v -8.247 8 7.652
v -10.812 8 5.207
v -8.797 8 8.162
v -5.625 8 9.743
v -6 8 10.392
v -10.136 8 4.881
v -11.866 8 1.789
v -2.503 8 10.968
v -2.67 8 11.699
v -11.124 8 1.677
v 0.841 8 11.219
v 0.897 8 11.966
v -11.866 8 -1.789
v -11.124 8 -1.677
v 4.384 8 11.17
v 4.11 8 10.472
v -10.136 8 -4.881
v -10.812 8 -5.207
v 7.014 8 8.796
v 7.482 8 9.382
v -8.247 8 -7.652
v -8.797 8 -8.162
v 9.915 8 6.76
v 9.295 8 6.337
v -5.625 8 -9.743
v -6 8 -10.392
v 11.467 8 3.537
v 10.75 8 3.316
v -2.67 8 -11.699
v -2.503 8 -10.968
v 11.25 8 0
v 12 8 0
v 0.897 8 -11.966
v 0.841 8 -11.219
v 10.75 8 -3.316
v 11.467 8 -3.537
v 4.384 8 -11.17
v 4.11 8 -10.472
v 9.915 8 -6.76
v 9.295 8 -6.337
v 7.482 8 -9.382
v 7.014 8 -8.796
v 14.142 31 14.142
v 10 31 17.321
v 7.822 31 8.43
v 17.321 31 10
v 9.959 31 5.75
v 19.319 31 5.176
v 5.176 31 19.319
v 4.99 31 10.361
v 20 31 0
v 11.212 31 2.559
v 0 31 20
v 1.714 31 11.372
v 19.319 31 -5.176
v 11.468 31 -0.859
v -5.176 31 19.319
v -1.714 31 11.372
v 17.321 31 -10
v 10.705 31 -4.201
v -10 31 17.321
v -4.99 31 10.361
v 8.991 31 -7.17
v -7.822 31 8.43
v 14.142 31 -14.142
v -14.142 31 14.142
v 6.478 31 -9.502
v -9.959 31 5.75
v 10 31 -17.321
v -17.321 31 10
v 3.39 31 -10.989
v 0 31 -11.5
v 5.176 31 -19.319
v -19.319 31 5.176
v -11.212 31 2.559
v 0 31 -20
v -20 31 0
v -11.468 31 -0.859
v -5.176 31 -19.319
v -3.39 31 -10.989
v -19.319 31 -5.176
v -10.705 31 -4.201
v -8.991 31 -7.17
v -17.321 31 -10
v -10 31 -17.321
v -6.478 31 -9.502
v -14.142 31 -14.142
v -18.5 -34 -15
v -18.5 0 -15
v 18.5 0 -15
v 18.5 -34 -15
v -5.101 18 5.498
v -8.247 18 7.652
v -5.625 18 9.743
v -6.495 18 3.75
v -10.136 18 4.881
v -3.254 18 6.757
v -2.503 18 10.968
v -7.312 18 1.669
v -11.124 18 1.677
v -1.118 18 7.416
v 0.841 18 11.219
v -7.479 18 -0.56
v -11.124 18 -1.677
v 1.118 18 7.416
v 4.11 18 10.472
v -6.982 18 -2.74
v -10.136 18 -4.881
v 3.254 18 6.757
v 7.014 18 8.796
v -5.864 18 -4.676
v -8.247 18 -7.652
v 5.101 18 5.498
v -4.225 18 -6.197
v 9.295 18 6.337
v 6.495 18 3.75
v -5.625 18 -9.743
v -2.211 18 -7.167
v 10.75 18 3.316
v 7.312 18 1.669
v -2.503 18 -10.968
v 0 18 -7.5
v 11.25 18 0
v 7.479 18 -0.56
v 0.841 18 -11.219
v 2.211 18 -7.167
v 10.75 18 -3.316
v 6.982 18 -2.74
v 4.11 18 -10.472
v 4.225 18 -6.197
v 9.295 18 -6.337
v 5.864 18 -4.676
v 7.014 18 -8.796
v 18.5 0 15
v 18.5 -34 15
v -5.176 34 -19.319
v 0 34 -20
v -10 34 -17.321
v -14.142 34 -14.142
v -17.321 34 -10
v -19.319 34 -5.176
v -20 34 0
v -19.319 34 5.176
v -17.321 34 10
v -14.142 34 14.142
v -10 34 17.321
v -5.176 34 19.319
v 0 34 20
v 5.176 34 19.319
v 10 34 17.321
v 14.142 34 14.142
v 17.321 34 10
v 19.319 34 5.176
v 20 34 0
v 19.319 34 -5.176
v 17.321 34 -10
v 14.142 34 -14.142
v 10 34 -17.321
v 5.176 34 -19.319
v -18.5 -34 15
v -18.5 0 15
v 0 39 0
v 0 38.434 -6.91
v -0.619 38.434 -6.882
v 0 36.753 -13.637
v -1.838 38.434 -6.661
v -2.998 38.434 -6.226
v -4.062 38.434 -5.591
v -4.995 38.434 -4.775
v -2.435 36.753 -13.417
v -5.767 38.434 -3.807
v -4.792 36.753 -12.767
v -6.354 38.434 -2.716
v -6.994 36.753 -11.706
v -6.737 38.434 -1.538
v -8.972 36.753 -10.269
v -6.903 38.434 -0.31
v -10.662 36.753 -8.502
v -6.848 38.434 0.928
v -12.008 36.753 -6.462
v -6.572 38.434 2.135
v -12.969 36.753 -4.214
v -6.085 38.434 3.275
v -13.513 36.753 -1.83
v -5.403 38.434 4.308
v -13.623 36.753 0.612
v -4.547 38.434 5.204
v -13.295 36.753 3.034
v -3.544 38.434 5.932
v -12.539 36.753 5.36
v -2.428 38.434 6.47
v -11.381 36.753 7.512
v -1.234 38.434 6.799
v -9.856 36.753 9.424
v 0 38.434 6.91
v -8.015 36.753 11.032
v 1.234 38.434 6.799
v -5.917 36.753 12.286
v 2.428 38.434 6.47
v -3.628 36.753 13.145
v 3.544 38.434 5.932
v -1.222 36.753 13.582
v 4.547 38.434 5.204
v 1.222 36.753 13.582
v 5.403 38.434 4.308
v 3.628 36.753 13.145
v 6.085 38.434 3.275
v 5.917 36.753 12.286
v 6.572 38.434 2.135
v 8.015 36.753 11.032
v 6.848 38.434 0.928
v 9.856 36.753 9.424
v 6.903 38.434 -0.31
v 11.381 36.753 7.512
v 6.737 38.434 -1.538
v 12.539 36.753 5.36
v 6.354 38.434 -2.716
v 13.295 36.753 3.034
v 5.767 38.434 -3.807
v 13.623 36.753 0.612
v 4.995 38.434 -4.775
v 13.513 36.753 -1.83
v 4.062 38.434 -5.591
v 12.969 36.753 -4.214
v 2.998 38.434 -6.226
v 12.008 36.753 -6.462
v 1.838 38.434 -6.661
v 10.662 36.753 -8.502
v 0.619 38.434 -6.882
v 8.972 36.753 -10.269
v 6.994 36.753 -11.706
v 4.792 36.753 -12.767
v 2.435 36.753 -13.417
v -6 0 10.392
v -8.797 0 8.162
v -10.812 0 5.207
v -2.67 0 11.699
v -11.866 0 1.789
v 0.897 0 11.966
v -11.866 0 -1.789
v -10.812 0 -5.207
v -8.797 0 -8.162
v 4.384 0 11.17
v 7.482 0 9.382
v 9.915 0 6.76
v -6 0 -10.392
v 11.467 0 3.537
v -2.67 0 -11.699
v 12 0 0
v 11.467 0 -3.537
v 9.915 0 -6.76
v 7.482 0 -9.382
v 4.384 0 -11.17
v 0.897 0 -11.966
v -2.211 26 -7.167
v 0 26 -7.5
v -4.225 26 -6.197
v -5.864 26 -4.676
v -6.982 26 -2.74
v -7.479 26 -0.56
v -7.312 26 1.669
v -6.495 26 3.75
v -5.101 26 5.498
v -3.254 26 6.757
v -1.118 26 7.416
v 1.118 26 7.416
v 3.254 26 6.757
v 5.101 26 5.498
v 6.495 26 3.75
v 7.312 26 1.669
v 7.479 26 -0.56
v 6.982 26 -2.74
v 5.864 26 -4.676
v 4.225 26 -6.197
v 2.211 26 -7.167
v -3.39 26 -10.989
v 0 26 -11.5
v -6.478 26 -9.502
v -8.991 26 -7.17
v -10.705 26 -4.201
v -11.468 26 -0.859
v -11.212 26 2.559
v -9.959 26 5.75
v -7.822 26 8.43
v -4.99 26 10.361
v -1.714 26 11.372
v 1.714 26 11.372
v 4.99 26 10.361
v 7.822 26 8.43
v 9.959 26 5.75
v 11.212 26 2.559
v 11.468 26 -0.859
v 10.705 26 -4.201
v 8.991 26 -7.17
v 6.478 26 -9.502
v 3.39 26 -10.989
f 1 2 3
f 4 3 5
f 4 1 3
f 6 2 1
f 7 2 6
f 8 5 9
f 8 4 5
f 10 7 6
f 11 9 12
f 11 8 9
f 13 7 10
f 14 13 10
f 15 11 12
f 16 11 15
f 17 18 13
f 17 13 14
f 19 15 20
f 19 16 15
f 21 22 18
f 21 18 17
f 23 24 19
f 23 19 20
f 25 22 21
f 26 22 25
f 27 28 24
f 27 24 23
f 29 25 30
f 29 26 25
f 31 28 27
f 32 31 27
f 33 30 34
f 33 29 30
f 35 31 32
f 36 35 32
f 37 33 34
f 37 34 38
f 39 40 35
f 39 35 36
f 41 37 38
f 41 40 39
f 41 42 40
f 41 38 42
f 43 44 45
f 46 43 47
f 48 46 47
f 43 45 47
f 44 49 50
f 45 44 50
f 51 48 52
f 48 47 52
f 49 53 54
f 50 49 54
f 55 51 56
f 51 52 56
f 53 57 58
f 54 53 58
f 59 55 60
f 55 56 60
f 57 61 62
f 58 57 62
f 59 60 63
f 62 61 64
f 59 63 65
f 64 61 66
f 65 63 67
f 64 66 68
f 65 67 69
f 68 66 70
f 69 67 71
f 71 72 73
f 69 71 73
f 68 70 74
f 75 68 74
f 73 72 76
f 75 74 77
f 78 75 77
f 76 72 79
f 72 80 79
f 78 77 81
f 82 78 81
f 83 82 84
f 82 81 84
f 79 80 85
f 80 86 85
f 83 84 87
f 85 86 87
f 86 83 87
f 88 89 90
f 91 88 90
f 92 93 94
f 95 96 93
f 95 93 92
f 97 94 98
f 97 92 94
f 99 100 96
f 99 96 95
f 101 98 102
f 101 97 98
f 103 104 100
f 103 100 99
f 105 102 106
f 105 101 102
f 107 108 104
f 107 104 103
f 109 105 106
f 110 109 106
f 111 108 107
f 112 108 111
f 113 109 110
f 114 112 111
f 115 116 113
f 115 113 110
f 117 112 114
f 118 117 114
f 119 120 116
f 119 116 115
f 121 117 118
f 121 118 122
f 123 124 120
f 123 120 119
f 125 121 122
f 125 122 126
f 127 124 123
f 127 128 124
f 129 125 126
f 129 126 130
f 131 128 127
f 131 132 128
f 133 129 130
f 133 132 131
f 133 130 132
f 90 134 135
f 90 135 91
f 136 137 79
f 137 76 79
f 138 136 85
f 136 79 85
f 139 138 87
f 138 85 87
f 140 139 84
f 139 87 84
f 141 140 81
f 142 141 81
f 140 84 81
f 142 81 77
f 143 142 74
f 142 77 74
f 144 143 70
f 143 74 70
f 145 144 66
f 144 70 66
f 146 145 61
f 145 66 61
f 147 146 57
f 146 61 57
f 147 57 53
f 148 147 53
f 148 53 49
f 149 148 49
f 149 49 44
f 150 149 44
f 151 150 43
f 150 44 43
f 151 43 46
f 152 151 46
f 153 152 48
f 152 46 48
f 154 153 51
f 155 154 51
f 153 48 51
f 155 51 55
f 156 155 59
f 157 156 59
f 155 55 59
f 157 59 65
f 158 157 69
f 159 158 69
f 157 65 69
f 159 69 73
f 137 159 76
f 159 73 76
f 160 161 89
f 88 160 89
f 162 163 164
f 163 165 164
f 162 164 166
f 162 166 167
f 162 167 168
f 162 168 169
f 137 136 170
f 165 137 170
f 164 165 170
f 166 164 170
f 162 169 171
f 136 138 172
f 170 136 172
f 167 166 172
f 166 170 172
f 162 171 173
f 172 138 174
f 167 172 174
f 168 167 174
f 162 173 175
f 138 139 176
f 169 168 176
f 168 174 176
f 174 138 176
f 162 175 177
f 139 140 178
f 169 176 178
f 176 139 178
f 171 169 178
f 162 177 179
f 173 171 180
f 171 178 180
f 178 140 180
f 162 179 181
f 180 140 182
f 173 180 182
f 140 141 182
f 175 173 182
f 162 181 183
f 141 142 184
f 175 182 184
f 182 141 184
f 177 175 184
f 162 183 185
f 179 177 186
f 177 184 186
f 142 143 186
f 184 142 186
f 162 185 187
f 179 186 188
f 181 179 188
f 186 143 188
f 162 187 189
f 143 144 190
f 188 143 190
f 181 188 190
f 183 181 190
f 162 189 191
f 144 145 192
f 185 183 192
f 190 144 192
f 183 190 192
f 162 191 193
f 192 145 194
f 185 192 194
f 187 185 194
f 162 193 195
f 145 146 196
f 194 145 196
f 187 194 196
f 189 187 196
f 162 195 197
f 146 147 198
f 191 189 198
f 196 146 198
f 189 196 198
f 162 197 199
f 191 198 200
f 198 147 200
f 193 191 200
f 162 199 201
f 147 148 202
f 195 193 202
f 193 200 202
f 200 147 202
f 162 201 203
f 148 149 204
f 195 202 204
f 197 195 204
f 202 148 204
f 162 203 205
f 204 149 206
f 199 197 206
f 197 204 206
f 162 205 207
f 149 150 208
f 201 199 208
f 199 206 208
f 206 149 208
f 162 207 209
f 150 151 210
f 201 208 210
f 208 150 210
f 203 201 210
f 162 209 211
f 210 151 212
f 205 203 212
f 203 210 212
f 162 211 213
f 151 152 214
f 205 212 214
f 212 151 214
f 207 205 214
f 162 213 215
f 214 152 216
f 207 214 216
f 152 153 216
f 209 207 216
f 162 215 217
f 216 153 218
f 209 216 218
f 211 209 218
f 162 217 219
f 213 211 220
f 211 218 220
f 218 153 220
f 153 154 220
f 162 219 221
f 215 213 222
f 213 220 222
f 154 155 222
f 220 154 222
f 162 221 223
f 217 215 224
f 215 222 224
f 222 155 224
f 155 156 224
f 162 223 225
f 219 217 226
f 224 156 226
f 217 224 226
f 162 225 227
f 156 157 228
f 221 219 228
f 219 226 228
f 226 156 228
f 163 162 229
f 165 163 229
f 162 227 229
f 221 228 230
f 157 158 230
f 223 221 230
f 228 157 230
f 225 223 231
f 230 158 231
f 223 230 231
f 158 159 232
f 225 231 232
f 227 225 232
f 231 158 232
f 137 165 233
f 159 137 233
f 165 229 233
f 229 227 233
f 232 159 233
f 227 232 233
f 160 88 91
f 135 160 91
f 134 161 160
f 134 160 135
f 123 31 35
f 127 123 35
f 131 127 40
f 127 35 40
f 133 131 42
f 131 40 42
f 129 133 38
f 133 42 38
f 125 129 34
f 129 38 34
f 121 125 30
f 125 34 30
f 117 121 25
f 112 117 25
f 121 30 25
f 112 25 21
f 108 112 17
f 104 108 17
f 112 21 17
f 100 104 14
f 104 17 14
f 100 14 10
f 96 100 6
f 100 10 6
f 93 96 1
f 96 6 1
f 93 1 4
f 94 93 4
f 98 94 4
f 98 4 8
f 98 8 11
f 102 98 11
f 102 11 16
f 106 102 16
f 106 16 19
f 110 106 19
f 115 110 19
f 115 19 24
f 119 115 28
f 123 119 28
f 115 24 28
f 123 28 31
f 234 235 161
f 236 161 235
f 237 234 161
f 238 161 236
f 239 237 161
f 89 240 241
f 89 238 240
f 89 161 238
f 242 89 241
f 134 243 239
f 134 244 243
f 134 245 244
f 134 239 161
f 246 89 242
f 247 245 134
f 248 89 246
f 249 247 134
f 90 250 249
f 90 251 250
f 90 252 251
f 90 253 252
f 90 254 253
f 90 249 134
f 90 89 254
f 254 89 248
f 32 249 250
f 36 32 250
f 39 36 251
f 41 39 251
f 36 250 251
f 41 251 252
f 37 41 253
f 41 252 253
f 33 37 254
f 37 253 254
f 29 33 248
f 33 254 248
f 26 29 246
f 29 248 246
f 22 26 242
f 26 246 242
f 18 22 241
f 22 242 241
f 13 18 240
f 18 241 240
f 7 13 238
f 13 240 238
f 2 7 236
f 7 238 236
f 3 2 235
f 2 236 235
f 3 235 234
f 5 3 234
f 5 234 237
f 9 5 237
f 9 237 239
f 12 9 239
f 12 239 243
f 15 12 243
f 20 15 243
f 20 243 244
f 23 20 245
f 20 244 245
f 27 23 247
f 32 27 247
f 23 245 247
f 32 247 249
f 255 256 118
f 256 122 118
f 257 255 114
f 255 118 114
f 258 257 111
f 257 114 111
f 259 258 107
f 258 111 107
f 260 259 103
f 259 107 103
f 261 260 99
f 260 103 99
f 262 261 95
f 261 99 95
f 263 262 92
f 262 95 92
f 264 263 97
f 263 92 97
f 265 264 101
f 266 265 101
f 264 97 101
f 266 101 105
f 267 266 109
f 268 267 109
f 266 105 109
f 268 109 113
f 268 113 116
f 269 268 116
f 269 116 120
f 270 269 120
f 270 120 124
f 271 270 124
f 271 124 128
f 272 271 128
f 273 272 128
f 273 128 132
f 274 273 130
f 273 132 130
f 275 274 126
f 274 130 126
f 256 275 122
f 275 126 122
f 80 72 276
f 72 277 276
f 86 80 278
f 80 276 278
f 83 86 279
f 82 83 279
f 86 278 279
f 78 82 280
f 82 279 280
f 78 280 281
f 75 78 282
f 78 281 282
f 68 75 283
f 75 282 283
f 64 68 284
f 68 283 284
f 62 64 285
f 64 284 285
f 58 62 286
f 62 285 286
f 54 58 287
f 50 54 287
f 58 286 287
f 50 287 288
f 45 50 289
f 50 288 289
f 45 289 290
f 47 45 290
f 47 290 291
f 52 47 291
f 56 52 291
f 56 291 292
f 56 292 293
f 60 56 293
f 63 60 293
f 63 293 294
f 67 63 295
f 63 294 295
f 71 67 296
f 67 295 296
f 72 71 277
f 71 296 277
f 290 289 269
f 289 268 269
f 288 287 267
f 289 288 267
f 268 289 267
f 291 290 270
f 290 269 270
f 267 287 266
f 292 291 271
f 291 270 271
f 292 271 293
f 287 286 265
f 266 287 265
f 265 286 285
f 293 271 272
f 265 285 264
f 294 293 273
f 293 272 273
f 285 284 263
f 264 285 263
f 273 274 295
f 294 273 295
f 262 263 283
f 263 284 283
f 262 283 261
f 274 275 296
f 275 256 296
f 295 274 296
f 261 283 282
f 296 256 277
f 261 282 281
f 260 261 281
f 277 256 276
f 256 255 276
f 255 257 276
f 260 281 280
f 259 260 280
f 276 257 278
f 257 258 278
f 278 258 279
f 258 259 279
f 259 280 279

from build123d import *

# Parameters (mm, degrees)
SKETCH_1_W      = 37
SKETCH_1_H      = 30
EXTRUDE_1_DEPTH = 34
SKETCH_2_R      = 12
EXTRUDE_2_DEPTH = 8
SKETCH_3_R      = 11.25
EXTRUDE_3_DEPTH = 10


with BuildPart() as part:
    # Эскиз1 → Бобышка-Вытянуть1 (new body)
    with BuildSketch(Plane(origin=(0, 0, 0), x_dir=(1, 0, 0), z_dir=(0, 1, 0))):
        Rectangle(SKETCH_1_W, SKETCH_1_H)
    extrude(amount=-EXTRUDE_1_DEPTH)

    # Эскиз2 → Бобышка-Вытянуть2 (add)
    with BuildSketch(Plane(origin=(0, 0, 0), x_dir=(1, 0, 0), z_dir=(0, 1, 0))):
        Circle(SKETCH_2_R)
    extrude(amount=EXTRUDE_2_DEPTH)

    # Эскиз3 → Бобышка-Вытянуть3 (add)
    with BuildSketch(Plane(origin=(0, 8, 0), x_dir=(1, 0, 0), z_dir=(0, 1, 0))):
        Circle(SKETCH_3_R)
    extrude(amount=EXTRUDE_3_DEPTH)

    # Эскиз4 → Повернуть1 (revolve)
    with BuildSketch(Plane(origin=(0, 0, 0), x_dir=(0, 0, -1), z_dir=(1, 0, 0))):
        with BuildLine():
            Line((0, 18), (0, 39))
            ThreePointArc((0, 39), (10.307764064, 37.731056256), (20, 34))
            Line((20, 34), (20, 31))
            Line((20, 31), (11.5, 31))
            Line((11.5, 31), (11.5, 26))
            Line((11.5, 26), (7.5, 26))
            Line((7.5, 26), (7.5, 18))
            Line((7.5, 18), (0, 18))
        make_face()
    revolve(axis=Axis((0, -965.379937914, 0), (0, 1, 0)))


solid = part.part
